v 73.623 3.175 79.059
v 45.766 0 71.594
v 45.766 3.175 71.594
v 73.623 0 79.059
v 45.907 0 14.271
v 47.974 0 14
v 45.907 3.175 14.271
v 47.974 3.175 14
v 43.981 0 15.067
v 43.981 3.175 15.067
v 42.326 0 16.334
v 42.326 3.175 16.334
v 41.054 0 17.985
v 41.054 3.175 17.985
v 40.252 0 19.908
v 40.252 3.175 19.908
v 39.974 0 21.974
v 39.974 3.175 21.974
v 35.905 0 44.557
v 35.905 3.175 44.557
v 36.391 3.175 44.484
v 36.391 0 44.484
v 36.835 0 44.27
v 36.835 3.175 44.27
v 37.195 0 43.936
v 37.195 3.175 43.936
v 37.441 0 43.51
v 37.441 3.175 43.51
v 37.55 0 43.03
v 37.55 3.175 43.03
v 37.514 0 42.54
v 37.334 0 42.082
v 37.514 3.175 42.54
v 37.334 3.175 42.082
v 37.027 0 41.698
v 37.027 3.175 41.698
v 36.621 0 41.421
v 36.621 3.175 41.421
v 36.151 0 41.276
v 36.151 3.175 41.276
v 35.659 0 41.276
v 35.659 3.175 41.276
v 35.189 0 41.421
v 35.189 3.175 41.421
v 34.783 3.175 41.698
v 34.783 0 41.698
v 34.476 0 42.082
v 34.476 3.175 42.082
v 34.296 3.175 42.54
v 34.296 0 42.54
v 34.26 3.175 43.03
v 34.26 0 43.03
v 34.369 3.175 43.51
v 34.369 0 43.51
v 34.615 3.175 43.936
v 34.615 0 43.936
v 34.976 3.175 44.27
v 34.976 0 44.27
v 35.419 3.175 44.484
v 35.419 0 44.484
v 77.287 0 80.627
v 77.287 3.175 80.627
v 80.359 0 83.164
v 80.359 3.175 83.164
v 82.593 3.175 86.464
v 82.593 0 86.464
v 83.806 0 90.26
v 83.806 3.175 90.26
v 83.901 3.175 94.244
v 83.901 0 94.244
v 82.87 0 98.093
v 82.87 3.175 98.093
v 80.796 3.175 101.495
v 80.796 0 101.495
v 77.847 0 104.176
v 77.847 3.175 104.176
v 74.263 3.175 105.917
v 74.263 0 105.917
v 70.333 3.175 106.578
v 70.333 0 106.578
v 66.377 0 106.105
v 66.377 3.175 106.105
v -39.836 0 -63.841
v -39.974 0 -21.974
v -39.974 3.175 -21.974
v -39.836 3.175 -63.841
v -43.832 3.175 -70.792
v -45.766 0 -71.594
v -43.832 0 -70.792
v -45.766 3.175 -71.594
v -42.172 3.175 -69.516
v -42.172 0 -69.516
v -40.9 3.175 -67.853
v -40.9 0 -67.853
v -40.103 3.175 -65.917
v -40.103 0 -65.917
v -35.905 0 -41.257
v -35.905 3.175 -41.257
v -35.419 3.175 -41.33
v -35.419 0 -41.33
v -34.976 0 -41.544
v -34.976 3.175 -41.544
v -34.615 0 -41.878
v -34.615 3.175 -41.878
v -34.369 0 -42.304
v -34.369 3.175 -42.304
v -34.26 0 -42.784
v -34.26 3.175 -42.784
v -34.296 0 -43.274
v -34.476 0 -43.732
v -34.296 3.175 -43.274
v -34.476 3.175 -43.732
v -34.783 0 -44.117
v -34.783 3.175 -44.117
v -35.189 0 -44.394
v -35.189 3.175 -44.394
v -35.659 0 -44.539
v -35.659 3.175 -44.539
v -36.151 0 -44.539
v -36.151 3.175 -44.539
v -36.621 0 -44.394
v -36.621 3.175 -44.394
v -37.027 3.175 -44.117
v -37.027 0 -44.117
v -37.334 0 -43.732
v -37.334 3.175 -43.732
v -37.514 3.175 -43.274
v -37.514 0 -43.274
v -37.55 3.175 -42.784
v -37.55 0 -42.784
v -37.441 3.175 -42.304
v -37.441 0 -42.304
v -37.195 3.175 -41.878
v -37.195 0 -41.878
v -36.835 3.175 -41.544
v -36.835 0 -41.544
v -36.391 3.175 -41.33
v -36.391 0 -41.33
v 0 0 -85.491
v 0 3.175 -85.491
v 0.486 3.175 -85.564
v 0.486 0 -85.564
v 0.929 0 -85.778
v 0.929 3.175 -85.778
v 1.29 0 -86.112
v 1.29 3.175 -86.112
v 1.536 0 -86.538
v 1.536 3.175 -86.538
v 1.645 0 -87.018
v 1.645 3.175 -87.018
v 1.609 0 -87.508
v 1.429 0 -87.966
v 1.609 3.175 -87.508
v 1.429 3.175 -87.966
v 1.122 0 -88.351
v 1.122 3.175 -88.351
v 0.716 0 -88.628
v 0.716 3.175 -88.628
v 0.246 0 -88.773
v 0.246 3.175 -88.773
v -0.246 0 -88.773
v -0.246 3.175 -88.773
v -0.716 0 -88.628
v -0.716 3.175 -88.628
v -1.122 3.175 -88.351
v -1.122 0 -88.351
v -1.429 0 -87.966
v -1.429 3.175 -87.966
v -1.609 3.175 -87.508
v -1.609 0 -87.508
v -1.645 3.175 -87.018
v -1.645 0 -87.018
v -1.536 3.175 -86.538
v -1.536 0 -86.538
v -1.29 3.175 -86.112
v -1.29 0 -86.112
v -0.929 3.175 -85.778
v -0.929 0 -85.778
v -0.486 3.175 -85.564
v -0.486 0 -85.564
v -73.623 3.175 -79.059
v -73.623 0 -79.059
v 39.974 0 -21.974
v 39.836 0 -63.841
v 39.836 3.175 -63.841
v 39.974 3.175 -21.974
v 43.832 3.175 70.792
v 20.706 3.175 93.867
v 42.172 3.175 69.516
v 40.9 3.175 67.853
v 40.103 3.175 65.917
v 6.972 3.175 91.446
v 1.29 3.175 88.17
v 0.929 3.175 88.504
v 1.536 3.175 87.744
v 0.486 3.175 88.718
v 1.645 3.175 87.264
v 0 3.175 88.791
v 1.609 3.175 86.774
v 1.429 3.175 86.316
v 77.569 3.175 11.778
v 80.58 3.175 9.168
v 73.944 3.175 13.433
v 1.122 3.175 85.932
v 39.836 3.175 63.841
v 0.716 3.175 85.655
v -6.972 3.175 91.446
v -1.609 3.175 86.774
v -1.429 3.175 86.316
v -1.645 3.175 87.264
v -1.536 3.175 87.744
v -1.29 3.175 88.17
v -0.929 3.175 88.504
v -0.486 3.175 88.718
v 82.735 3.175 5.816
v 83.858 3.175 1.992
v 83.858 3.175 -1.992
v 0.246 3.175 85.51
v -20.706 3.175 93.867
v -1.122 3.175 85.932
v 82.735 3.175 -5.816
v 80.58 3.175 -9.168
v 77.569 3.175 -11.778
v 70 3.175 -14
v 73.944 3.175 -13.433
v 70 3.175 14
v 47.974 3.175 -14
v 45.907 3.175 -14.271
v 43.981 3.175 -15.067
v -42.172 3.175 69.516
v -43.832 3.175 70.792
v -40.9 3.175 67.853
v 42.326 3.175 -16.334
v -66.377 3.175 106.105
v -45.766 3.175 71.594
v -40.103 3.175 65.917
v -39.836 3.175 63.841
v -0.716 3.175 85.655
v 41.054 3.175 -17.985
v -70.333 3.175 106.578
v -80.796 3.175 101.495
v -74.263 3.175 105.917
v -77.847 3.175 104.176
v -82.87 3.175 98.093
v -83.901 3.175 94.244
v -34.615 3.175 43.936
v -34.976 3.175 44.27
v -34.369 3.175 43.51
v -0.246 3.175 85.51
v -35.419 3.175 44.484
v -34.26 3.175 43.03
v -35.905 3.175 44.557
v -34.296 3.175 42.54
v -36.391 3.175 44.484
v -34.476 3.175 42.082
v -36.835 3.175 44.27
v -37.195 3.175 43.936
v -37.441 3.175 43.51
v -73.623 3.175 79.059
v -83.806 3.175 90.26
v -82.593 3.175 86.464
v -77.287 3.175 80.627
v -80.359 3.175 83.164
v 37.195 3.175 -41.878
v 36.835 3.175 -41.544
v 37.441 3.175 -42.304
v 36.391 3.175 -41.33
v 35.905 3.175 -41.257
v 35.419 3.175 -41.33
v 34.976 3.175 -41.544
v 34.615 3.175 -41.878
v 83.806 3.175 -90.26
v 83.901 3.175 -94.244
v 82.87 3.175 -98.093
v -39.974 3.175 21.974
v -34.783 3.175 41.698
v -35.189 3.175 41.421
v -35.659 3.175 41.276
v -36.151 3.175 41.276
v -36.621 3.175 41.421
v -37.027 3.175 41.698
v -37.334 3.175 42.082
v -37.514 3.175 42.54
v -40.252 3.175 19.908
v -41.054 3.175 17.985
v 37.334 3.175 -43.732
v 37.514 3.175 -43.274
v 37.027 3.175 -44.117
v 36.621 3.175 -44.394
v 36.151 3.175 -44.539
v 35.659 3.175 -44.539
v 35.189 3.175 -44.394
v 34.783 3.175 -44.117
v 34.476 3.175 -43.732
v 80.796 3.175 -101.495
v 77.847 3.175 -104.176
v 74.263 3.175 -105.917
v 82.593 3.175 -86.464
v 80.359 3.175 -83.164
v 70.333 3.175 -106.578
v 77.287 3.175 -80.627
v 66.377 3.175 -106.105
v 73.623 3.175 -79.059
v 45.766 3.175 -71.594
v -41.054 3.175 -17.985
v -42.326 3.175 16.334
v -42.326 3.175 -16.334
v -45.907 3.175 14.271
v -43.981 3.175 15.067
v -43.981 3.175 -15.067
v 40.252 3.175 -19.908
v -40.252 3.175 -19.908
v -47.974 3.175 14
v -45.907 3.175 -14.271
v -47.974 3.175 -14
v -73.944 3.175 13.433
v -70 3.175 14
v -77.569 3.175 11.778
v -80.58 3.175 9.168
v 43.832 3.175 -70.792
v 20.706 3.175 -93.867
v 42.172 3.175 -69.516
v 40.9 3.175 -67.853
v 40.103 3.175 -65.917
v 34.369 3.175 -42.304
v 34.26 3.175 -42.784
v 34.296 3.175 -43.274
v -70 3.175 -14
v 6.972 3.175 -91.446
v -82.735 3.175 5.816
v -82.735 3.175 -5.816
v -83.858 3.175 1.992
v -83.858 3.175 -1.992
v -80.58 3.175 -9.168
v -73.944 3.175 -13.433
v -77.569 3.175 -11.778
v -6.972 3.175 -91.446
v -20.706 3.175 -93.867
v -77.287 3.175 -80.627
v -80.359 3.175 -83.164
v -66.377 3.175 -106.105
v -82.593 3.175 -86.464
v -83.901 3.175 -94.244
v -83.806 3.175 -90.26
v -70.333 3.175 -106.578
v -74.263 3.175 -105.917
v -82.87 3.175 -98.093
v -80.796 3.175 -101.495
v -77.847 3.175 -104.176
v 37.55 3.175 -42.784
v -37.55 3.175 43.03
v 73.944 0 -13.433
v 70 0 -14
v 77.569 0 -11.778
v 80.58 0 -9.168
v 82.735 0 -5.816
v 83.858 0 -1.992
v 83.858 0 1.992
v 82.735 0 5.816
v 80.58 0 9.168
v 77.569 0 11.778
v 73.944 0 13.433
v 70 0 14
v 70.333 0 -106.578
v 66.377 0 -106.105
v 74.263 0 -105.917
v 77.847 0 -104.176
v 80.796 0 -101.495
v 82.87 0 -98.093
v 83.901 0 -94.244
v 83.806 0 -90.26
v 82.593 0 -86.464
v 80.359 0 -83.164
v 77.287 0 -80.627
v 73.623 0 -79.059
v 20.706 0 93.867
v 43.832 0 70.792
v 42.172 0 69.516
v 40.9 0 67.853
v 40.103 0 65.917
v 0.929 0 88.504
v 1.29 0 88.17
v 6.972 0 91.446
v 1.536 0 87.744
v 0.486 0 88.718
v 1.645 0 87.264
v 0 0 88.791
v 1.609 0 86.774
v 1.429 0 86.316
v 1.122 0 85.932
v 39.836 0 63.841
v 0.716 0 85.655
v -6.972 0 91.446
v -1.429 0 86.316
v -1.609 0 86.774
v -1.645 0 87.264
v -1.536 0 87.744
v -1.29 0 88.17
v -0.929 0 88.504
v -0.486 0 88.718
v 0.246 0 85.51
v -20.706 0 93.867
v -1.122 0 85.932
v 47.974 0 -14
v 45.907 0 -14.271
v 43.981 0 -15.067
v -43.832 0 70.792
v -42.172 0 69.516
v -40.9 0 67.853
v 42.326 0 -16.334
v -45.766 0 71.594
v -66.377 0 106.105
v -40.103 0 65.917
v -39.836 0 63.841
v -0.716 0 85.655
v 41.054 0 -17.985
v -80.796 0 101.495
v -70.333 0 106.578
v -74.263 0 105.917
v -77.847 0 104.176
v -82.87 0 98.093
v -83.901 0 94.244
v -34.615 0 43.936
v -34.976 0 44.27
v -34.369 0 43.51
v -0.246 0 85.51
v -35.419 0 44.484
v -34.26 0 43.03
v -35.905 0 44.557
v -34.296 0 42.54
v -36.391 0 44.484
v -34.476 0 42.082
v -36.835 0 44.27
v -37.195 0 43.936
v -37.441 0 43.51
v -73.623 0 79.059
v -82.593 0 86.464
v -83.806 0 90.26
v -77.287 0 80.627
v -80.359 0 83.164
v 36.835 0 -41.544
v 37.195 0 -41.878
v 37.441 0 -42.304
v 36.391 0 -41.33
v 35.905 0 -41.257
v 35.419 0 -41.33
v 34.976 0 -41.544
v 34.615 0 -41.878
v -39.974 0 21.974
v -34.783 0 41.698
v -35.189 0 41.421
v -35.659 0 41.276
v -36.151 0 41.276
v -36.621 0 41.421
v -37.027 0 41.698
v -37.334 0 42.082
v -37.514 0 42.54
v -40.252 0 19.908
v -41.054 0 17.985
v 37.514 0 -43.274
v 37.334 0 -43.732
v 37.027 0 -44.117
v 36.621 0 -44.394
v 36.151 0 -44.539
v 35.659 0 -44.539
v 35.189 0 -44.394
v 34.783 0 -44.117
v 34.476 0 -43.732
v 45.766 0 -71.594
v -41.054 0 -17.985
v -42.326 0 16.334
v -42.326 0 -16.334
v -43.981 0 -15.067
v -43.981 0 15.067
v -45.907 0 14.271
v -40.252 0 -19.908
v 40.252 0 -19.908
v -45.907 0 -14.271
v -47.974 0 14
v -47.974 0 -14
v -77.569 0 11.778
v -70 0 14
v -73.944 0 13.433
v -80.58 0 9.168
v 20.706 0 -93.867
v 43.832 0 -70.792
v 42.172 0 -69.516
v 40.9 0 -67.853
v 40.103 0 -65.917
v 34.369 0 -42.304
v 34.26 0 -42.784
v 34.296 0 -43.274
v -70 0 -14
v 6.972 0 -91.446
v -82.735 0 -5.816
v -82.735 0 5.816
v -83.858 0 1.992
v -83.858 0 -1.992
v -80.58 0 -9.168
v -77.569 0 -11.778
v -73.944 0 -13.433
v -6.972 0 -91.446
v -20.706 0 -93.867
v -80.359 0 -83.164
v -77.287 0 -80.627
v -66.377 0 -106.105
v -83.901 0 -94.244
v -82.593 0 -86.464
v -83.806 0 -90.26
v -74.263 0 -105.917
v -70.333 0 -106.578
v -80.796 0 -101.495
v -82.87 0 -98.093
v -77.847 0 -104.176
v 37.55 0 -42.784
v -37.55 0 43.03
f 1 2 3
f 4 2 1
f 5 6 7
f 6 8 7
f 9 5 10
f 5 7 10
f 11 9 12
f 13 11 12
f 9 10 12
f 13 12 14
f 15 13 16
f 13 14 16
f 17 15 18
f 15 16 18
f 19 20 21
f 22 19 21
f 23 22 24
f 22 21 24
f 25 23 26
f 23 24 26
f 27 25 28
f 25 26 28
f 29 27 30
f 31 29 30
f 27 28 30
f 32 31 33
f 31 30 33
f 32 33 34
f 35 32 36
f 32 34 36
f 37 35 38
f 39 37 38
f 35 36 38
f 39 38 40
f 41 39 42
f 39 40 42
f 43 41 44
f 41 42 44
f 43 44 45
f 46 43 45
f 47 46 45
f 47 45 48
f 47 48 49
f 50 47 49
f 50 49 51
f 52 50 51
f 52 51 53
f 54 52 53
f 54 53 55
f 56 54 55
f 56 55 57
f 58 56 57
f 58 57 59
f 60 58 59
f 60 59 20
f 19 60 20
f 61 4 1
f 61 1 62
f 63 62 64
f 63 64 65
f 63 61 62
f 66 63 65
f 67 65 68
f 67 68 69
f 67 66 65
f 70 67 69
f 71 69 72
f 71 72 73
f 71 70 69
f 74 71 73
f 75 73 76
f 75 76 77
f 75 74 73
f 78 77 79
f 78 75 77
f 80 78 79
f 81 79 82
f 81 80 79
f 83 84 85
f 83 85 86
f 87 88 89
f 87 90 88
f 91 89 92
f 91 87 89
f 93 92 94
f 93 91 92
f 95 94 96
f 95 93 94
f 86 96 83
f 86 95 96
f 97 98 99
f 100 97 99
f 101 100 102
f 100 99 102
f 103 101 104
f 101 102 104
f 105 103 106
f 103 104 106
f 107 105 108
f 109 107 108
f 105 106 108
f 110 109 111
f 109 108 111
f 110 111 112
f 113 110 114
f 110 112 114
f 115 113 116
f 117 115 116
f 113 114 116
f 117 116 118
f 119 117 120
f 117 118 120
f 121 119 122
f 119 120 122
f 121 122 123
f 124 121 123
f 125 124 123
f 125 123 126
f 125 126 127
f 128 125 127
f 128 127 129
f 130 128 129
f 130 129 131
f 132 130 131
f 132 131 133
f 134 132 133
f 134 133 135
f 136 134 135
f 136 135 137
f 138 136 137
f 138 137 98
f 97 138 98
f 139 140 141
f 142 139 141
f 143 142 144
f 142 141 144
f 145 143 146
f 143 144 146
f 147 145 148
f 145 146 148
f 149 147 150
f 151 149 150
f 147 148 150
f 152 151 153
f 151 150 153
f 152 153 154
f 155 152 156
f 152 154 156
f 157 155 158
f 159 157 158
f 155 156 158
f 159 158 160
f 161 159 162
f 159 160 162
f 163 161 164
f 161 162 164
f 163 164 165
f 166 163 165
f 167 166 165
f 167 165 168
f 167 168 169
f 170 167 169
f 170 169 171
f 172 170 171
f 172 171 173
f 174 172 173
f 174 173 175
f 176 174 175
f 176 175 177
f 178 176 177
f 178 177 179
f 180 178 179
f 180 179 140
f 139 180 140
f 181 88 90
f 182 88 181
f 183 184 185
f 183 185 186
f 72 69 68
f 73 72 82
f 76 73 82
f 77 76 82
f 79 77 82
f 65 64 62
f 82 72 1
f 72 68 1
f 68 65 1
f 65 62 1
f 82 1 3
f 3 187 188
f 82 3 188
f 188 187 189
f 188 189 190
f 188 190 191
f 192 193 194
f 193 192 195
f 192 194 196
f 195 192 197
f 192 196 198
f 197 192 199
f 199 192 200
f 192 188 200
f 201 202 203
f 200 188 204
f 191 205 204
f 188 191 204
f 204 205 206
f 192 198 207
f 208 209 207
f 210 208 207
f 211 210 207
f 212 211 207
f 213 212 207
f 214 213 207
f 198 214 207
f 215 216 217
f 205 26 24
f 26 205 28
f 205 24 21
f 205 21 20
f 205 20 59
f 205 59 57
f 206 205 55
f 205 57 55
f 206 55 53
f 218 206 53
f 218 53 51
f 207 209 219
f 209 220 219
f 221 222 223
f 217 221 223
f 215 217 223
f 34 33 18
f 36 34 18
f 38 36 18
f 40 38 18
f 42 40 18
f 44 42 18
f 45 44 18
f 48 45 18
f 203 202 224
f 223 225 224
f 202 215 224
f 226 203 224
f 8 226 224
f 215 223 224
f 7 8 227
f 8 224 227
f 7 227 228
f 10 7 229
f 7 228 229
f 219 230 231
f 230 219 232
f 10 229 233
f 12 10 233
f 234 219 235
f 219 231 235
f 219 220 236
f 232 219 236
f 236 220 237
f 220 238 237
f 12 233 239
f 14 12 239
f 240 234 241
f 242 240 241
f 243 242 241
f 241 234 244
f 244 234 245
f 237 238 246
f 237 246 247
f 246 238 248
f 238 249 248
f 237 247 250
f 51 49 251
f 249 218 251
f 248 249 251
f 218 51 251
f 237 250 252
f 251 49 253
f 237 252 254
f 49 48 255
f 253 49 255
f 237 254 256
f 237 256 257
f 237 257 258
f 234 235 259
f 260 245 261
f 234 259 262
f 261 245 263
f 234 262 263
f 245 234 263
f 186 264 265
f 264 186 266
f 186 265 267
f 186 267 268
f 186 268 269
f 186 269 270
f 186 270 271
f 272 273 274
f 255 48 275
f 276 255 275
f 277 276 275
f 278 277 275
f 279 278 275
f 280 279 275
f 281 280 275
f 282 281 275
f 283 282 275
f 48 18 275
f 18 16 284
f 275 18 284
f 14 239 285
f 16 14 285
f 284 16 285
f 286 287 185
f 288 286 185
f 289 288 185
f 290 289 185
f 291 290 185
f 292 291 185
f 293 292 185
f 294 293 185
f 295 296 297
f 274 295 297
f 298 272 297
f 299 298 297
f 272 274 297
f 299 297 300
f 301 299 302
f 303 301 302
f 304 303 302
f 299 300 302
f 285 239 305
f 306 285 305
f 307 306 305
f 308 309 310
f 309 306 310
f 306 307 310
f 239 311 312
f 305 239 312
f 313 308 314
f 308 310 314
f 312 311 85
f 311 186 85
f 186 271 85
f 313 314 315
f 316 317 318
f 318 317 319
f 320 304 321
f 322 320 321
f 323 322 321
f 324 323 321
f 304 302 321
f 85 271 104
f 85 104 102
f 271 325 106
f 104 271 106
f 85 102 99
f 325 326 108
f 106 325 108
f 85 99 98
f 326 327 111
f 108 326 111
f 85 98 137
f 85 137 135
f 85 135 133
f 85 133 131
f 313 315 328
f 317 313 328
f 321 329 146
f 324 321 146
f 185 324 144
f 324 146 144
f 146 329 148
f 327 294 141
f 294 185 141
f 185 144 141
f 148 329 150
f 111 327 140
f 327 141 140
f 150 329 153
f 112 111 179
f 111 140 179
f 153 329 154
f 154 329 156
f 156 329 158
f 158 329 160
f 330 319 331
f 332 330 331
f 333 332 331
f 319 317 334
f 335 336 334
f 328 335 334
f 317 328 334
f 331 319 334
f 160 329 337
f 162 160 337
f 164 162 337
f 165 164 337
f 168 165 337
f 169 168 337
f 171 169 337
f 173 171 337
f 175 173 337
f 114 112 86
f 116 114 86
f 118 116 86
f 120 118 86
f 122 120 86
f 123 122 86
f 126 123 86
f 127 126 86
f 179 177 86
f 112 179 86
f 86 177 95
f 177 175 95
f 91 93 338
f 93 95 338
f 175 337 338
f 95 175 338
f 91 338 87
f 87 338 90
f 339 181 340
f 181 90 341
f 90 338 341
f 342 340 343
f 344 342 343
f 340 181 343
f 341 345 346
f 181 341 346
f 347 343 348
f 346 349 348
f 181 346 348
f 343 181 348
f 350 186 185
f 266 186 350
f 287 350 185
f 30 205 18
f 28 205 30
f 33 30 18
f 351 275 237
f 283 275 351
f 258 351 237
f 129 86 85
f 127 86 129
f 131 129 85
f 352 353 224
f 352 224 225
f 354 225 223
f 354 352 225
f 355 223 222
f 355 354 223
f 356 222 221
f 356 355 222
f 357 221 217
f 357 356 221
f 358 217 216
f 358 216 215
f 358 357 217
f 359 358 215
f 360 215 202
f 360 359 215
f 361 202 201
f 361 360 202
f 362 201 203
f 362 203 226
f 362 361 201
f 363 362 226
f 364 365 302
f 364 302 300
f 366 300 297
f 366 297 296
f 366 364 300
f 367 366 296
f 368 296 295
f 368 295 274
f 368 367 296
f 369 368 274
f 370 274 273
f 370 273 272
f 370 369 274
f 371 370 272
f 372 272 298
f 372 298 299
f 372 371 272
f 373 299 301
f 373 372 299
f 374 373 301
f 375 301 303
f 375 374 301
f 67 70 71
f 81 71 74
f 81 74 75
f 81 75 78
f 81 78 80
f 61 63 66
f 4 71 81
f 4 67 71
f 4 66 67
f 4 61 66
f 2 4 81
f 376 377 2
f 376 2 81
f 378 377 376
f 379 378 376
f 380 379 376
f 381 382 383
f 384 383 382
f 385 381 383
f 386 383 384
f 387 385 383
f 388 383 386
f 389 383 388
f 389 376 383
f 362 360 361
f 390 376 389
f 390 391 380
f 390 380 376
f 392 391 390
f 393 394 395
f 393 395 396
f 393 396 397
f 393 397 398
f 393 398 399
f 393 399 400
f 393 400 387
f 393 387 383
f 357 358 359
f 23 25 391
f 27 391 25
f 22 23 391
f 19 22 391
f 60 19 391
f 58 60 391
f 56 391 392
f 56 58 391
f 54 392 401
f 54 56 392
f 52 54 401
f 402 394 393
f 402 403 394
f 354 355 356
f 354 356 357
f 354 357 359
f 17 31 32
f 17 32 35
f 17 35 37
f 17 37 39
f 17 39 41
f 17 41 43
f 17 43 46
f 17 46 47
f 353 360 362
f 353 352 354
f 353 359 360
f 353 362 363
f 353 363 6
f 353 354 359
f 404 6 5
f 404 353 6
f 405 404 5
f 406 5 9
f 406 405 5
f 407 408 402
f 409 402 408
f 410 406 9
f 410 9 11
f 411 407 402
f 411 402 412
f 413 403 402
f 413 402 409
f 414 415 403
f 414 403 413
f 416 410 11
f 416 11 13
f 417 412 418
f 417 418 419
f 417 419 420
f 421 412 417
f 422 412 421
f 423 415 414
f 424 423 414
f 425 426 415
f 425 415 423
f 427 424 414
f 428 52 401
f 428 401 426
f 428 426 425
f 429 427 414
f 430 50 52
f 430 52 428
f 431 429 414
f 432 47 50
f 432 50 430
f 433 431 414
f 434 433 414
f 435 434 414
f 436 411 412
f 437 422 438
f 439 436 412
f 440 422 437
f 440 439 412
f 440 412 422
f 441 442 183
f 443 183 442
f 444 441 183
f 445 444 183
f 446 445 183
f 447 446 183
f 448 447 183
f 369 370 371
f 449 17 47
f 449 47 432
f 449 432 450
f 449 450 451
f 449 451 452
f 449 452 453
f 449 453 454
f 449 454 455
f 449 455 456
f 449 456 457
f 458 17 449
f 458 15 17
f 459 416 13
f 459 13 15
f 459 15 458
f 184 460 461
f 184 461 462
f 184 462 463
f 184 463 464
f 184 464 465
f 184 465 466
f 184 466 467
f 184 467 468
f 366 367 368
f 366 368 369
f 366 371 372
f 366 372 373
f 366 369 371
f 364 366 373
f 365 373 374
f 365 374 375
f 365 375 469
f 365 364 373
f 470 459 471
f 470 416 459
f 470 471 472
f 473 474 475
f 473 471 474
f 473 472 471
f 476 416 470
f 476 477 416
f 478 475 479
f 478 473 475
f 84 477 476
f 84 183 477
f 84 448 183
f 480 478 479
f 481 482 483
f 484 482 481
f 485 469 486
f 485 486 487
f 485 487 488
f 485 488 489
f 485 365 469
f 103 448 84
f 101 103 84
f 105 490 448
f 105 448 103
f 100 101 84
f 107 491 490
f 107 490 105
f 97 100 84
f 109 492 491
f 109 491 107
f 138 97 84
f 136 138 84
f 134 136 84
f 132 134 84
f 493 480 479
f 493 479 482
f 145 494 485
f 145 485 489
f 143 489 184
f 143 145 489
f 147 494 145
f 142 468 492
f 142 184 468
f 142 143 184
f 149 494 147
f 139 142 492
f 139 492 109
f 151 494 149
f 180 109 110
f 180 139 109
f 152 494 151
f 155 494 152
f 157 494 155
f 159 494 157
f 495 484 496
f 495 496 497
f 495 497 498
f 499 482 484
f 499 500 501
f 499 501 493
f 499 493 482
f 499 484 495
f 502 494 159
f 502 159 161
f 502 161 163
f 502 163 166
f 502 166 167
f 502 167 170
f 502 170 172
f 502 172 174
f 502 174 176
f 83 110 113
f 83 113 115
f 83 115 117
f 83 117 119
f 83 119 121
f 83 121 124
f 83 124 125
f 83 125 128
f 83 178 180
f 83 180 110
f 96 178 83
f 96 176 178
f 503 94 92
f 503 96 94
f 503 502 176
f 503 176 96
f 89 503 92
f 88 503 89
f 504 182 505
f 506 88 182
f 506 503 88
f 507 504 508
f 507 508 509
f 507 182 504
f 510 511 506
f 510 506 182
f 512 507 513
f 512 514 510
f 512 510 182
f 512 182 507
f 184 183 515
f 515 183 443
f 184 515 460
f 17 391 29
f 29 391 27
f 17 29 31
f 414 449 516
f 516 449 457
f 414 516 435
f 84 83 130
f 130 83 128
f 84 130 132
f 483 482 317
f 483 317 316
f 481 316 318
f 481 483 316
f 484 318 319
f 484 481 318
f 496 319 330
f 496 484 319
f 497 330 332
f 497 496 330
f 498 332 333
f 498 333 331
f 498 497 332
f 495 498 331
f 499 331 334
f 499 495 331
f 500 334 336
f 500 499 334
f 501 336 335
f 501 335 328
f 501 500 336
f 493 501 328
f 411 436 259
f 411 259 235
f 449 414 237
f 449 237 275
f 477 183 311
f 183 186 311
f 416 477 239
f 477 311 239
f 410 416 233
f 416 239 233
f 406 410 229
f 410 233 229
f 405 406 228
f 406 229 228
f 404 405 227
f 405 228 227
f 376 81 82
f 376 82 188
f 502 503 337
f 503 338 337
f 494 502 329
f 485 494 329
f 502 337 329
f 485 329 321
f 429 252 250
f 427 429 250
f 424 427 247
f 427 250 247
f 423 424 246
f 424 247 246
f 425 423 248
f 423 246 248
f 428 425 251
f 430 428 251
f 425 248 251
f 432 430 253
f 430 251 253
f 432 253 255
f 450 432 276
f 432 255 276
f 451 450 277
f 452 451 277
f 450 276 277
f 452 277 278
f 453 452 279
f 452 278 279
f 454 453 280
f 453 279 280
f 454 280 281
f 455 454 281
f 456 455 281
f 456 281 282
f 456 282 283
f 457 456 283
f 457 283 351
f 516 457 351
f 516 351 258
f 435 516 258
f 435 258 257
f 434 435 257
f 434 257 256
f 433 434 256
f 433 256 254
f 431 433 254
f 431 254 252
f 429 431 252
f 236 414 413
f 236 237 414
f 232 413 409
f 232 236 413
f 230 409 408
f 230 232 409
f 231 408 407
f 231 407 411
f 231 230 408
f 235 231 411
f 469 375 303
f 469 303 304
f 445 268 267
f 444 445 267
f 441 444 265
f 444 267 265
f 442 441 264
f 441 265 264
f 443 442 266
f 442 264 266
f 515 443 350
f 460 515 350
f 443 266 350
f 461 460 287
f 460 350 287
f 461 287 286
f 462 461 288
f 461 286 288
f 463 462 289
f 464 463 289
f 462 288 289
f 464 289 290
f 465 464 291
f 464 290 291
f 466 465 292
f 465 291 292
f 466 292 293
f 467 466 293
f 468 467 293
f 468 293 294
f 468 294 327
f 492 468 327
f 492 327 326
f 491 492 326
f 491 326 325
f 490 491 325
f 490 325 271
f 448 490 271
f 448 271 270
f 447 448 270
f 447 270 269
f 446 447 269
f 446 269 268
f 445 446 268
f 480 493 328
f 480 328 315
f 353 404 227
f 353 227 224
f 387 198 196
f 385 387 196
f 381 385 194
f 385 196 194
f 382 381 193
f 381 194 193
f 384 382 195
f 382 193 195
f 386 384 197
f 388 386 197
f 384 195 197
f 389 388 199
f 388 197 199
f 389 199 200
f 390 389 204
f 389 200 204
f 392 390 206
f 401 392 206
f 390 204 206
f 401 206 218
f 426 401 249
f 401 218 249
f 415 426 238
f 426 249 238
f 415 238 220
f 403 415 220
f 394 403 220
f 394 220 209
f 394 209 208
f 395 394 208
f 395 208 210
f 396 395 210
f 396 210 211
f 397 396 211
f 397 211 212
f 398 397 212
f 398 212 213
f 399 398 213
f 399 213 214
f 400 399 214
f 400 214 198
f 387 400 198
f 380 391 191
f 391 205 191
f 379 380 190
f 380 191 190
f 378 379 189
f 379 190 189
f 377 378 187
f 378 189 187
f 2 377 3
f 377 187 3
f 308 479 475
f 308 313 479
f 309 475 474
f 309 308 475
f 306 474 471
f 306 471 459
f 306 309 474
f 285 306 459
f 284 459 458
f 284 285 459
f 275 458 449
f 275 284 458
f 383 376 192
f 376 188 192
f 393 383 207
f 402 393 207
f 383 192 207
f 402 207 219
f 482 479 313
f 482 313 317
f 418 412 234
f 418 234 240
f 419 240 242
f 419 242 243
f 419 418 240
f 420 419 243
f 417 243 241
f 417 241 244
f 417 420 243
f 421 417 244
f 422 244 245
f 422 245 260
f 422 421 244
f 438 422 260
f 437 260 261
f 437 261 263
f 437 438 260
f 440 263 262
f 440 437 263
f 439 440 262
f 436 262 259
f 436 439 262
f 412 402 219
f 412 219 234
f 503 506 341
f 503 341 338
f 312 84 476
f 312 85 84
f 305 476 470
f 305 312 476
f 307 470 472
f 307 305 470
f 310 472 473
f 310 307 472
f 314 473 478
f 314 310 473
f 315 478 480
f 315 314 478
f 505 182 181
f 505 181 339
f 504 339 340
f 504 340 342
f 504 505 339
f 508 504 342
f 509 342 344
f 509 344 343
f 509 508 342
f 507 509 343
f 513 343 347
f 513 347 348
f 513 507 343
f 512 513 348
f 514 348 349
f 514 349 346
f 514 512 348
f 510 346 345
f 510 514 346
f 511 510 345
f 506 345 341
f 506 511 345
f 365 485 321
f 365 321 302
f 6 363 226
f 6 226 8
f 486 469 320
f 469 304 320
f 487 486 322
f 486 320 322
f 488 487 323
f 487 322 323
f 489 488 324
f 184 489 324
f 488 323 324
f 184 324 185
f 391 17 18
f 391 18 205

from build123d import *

# Parameters (mm, degrees)
BOSS_EXTRUDE1_DEPTH = 3.175
FILLET1_R           = 80
FILLET2_R           = 8
SKETCH2_R           = 1.65
CUT_EXTRUDE1_DEPTH  = 10


with BuildPart() as part:
    # Sketch1 → Boss-Extrude1 (new body)
    with BuildSketch(Plane(origin=(0, 0, 0), x_dir=(1, 0, 0), z_dir=(0, 1, 0))):
        with BuildLine():
            Line((-70, 14), (-40, 14))
            Line((-40, 14), (-39.816062711, 70))
            Line((-39.816062711, 70), (-73.623466631, 79.058666579))
            ThreePointArc((-73.623466631, 79.058666579), (-83.522961568, 96.205094778), (-66.376533369, 106.104589715))
            Line((-66.376533369, 106.104589715), (0, 88.319051202))
            Line((0, 88.319051202), (66.376533369, 106.104589715))
            ThreePointArc((66.376533369, 106.104589715), (83.522961568, 96.205094778), (73.623466631, 79.058666579))
            Line((73.623466631, 79.058666579), (39.816062711, 70))
            Line((39.816062711, 70), (40, 14))
            Line((40, 14), (70, 14))
            ThreePointArc((70, 14), (84, 0), (70, -14))
            Line((70, -14), (40, -14))
            Line((40, -14), (39.816062711, -70))
            Line((39.816062711, -70), (73.623466631, -79.058666579))
            ThreePointArc((73.623466631, -79.058666579), (83.522961568, -96.205094778), (66.376533369, -106.104589715))
            Line((66.376533369, -106.104589715), (0, -88.319051202))
            Line((0, -88.319051202), (-66.376533369, -106.104589715))
            ThreePointArc((-66.376533369, -106.104589715), (-83.522961568, -96.205094778), (-73.623466631, -79.058666579))
            Line((-73.623466631, -79.058666579), (-39.816062711, -70))
            Line((-39.816062711, -70), (-40, -14))
            Line((-40, -14), (-70, -14))
            ThreePointArc((-70, -14), (-84, 0), (-70, 14))
        make_face()
    extrude(amount=BOSS_EXTRUDE1_DEPTH)

    # Fillet1
    fillet1_edges = [part.edges().sort_by_distance(p)[0] for p in [
        (0, 1.5875, -88.319051202),
        (0, 1.5875, 88.319051202),
    ]]
    fillet(fillet1_edges, radius=FILLET1_R)

    # Fillet2
    fillet2_edges = [part.edges().sort_by_distance(p)[0] for p in [
        (-40, 1.5875, -14),
        (-39.816062711, 1.5875, -70),
        (39.816062711, 1.5875, -70),
        (40, 1.5875, -14),
        (40, 1.5875, 14),
        (39.816062711, 1.5875, 70),
        (-39.816062711, 1.5875, 70),
        (-40, 1.5875, 14),
    ]]
    fillet(fillet2_edges, radius=FILLET2_R)

    # Sketch2 → Cut-Extrude1 (cut)
    with BuildSketch(Plane(origin=(0, 3.175, 0), x_dir=(1, 0, 0), z_dir=(0, 1, 0))):
        with Locations(Location((0, 87.141145635, 0), (0, 0, 270))):
            Circle(SKETCH2_R)
        with Locations(Location((-35.905030257, 42.907120147, 0), (0, 0, 270))):
            Circle(SKETCH2_R)
        with Locations(Location((35.905030257, 42.907120147, 0), (0, 0, 270))):
            Circle(SKETCH2_R)
        with Locations(Location((35.905030257, -42.907120147, 0), (0, 0, 270))):
            Circle(SKETCH2_R)
        with Locations(Location((0, -87.141145635, 0), (0, 0, 270))):
            Circle(SKETCH2_R)
        with Locations(Location((-35.905030257, -42.907120147, 0), (0, 0, 270))):
            Circle(SKETCH2_R)
    extrude(amount=-CUT_EXTRUDE1_DEPTH, mode=Mode.SUBTRACT)


solid = part.part
